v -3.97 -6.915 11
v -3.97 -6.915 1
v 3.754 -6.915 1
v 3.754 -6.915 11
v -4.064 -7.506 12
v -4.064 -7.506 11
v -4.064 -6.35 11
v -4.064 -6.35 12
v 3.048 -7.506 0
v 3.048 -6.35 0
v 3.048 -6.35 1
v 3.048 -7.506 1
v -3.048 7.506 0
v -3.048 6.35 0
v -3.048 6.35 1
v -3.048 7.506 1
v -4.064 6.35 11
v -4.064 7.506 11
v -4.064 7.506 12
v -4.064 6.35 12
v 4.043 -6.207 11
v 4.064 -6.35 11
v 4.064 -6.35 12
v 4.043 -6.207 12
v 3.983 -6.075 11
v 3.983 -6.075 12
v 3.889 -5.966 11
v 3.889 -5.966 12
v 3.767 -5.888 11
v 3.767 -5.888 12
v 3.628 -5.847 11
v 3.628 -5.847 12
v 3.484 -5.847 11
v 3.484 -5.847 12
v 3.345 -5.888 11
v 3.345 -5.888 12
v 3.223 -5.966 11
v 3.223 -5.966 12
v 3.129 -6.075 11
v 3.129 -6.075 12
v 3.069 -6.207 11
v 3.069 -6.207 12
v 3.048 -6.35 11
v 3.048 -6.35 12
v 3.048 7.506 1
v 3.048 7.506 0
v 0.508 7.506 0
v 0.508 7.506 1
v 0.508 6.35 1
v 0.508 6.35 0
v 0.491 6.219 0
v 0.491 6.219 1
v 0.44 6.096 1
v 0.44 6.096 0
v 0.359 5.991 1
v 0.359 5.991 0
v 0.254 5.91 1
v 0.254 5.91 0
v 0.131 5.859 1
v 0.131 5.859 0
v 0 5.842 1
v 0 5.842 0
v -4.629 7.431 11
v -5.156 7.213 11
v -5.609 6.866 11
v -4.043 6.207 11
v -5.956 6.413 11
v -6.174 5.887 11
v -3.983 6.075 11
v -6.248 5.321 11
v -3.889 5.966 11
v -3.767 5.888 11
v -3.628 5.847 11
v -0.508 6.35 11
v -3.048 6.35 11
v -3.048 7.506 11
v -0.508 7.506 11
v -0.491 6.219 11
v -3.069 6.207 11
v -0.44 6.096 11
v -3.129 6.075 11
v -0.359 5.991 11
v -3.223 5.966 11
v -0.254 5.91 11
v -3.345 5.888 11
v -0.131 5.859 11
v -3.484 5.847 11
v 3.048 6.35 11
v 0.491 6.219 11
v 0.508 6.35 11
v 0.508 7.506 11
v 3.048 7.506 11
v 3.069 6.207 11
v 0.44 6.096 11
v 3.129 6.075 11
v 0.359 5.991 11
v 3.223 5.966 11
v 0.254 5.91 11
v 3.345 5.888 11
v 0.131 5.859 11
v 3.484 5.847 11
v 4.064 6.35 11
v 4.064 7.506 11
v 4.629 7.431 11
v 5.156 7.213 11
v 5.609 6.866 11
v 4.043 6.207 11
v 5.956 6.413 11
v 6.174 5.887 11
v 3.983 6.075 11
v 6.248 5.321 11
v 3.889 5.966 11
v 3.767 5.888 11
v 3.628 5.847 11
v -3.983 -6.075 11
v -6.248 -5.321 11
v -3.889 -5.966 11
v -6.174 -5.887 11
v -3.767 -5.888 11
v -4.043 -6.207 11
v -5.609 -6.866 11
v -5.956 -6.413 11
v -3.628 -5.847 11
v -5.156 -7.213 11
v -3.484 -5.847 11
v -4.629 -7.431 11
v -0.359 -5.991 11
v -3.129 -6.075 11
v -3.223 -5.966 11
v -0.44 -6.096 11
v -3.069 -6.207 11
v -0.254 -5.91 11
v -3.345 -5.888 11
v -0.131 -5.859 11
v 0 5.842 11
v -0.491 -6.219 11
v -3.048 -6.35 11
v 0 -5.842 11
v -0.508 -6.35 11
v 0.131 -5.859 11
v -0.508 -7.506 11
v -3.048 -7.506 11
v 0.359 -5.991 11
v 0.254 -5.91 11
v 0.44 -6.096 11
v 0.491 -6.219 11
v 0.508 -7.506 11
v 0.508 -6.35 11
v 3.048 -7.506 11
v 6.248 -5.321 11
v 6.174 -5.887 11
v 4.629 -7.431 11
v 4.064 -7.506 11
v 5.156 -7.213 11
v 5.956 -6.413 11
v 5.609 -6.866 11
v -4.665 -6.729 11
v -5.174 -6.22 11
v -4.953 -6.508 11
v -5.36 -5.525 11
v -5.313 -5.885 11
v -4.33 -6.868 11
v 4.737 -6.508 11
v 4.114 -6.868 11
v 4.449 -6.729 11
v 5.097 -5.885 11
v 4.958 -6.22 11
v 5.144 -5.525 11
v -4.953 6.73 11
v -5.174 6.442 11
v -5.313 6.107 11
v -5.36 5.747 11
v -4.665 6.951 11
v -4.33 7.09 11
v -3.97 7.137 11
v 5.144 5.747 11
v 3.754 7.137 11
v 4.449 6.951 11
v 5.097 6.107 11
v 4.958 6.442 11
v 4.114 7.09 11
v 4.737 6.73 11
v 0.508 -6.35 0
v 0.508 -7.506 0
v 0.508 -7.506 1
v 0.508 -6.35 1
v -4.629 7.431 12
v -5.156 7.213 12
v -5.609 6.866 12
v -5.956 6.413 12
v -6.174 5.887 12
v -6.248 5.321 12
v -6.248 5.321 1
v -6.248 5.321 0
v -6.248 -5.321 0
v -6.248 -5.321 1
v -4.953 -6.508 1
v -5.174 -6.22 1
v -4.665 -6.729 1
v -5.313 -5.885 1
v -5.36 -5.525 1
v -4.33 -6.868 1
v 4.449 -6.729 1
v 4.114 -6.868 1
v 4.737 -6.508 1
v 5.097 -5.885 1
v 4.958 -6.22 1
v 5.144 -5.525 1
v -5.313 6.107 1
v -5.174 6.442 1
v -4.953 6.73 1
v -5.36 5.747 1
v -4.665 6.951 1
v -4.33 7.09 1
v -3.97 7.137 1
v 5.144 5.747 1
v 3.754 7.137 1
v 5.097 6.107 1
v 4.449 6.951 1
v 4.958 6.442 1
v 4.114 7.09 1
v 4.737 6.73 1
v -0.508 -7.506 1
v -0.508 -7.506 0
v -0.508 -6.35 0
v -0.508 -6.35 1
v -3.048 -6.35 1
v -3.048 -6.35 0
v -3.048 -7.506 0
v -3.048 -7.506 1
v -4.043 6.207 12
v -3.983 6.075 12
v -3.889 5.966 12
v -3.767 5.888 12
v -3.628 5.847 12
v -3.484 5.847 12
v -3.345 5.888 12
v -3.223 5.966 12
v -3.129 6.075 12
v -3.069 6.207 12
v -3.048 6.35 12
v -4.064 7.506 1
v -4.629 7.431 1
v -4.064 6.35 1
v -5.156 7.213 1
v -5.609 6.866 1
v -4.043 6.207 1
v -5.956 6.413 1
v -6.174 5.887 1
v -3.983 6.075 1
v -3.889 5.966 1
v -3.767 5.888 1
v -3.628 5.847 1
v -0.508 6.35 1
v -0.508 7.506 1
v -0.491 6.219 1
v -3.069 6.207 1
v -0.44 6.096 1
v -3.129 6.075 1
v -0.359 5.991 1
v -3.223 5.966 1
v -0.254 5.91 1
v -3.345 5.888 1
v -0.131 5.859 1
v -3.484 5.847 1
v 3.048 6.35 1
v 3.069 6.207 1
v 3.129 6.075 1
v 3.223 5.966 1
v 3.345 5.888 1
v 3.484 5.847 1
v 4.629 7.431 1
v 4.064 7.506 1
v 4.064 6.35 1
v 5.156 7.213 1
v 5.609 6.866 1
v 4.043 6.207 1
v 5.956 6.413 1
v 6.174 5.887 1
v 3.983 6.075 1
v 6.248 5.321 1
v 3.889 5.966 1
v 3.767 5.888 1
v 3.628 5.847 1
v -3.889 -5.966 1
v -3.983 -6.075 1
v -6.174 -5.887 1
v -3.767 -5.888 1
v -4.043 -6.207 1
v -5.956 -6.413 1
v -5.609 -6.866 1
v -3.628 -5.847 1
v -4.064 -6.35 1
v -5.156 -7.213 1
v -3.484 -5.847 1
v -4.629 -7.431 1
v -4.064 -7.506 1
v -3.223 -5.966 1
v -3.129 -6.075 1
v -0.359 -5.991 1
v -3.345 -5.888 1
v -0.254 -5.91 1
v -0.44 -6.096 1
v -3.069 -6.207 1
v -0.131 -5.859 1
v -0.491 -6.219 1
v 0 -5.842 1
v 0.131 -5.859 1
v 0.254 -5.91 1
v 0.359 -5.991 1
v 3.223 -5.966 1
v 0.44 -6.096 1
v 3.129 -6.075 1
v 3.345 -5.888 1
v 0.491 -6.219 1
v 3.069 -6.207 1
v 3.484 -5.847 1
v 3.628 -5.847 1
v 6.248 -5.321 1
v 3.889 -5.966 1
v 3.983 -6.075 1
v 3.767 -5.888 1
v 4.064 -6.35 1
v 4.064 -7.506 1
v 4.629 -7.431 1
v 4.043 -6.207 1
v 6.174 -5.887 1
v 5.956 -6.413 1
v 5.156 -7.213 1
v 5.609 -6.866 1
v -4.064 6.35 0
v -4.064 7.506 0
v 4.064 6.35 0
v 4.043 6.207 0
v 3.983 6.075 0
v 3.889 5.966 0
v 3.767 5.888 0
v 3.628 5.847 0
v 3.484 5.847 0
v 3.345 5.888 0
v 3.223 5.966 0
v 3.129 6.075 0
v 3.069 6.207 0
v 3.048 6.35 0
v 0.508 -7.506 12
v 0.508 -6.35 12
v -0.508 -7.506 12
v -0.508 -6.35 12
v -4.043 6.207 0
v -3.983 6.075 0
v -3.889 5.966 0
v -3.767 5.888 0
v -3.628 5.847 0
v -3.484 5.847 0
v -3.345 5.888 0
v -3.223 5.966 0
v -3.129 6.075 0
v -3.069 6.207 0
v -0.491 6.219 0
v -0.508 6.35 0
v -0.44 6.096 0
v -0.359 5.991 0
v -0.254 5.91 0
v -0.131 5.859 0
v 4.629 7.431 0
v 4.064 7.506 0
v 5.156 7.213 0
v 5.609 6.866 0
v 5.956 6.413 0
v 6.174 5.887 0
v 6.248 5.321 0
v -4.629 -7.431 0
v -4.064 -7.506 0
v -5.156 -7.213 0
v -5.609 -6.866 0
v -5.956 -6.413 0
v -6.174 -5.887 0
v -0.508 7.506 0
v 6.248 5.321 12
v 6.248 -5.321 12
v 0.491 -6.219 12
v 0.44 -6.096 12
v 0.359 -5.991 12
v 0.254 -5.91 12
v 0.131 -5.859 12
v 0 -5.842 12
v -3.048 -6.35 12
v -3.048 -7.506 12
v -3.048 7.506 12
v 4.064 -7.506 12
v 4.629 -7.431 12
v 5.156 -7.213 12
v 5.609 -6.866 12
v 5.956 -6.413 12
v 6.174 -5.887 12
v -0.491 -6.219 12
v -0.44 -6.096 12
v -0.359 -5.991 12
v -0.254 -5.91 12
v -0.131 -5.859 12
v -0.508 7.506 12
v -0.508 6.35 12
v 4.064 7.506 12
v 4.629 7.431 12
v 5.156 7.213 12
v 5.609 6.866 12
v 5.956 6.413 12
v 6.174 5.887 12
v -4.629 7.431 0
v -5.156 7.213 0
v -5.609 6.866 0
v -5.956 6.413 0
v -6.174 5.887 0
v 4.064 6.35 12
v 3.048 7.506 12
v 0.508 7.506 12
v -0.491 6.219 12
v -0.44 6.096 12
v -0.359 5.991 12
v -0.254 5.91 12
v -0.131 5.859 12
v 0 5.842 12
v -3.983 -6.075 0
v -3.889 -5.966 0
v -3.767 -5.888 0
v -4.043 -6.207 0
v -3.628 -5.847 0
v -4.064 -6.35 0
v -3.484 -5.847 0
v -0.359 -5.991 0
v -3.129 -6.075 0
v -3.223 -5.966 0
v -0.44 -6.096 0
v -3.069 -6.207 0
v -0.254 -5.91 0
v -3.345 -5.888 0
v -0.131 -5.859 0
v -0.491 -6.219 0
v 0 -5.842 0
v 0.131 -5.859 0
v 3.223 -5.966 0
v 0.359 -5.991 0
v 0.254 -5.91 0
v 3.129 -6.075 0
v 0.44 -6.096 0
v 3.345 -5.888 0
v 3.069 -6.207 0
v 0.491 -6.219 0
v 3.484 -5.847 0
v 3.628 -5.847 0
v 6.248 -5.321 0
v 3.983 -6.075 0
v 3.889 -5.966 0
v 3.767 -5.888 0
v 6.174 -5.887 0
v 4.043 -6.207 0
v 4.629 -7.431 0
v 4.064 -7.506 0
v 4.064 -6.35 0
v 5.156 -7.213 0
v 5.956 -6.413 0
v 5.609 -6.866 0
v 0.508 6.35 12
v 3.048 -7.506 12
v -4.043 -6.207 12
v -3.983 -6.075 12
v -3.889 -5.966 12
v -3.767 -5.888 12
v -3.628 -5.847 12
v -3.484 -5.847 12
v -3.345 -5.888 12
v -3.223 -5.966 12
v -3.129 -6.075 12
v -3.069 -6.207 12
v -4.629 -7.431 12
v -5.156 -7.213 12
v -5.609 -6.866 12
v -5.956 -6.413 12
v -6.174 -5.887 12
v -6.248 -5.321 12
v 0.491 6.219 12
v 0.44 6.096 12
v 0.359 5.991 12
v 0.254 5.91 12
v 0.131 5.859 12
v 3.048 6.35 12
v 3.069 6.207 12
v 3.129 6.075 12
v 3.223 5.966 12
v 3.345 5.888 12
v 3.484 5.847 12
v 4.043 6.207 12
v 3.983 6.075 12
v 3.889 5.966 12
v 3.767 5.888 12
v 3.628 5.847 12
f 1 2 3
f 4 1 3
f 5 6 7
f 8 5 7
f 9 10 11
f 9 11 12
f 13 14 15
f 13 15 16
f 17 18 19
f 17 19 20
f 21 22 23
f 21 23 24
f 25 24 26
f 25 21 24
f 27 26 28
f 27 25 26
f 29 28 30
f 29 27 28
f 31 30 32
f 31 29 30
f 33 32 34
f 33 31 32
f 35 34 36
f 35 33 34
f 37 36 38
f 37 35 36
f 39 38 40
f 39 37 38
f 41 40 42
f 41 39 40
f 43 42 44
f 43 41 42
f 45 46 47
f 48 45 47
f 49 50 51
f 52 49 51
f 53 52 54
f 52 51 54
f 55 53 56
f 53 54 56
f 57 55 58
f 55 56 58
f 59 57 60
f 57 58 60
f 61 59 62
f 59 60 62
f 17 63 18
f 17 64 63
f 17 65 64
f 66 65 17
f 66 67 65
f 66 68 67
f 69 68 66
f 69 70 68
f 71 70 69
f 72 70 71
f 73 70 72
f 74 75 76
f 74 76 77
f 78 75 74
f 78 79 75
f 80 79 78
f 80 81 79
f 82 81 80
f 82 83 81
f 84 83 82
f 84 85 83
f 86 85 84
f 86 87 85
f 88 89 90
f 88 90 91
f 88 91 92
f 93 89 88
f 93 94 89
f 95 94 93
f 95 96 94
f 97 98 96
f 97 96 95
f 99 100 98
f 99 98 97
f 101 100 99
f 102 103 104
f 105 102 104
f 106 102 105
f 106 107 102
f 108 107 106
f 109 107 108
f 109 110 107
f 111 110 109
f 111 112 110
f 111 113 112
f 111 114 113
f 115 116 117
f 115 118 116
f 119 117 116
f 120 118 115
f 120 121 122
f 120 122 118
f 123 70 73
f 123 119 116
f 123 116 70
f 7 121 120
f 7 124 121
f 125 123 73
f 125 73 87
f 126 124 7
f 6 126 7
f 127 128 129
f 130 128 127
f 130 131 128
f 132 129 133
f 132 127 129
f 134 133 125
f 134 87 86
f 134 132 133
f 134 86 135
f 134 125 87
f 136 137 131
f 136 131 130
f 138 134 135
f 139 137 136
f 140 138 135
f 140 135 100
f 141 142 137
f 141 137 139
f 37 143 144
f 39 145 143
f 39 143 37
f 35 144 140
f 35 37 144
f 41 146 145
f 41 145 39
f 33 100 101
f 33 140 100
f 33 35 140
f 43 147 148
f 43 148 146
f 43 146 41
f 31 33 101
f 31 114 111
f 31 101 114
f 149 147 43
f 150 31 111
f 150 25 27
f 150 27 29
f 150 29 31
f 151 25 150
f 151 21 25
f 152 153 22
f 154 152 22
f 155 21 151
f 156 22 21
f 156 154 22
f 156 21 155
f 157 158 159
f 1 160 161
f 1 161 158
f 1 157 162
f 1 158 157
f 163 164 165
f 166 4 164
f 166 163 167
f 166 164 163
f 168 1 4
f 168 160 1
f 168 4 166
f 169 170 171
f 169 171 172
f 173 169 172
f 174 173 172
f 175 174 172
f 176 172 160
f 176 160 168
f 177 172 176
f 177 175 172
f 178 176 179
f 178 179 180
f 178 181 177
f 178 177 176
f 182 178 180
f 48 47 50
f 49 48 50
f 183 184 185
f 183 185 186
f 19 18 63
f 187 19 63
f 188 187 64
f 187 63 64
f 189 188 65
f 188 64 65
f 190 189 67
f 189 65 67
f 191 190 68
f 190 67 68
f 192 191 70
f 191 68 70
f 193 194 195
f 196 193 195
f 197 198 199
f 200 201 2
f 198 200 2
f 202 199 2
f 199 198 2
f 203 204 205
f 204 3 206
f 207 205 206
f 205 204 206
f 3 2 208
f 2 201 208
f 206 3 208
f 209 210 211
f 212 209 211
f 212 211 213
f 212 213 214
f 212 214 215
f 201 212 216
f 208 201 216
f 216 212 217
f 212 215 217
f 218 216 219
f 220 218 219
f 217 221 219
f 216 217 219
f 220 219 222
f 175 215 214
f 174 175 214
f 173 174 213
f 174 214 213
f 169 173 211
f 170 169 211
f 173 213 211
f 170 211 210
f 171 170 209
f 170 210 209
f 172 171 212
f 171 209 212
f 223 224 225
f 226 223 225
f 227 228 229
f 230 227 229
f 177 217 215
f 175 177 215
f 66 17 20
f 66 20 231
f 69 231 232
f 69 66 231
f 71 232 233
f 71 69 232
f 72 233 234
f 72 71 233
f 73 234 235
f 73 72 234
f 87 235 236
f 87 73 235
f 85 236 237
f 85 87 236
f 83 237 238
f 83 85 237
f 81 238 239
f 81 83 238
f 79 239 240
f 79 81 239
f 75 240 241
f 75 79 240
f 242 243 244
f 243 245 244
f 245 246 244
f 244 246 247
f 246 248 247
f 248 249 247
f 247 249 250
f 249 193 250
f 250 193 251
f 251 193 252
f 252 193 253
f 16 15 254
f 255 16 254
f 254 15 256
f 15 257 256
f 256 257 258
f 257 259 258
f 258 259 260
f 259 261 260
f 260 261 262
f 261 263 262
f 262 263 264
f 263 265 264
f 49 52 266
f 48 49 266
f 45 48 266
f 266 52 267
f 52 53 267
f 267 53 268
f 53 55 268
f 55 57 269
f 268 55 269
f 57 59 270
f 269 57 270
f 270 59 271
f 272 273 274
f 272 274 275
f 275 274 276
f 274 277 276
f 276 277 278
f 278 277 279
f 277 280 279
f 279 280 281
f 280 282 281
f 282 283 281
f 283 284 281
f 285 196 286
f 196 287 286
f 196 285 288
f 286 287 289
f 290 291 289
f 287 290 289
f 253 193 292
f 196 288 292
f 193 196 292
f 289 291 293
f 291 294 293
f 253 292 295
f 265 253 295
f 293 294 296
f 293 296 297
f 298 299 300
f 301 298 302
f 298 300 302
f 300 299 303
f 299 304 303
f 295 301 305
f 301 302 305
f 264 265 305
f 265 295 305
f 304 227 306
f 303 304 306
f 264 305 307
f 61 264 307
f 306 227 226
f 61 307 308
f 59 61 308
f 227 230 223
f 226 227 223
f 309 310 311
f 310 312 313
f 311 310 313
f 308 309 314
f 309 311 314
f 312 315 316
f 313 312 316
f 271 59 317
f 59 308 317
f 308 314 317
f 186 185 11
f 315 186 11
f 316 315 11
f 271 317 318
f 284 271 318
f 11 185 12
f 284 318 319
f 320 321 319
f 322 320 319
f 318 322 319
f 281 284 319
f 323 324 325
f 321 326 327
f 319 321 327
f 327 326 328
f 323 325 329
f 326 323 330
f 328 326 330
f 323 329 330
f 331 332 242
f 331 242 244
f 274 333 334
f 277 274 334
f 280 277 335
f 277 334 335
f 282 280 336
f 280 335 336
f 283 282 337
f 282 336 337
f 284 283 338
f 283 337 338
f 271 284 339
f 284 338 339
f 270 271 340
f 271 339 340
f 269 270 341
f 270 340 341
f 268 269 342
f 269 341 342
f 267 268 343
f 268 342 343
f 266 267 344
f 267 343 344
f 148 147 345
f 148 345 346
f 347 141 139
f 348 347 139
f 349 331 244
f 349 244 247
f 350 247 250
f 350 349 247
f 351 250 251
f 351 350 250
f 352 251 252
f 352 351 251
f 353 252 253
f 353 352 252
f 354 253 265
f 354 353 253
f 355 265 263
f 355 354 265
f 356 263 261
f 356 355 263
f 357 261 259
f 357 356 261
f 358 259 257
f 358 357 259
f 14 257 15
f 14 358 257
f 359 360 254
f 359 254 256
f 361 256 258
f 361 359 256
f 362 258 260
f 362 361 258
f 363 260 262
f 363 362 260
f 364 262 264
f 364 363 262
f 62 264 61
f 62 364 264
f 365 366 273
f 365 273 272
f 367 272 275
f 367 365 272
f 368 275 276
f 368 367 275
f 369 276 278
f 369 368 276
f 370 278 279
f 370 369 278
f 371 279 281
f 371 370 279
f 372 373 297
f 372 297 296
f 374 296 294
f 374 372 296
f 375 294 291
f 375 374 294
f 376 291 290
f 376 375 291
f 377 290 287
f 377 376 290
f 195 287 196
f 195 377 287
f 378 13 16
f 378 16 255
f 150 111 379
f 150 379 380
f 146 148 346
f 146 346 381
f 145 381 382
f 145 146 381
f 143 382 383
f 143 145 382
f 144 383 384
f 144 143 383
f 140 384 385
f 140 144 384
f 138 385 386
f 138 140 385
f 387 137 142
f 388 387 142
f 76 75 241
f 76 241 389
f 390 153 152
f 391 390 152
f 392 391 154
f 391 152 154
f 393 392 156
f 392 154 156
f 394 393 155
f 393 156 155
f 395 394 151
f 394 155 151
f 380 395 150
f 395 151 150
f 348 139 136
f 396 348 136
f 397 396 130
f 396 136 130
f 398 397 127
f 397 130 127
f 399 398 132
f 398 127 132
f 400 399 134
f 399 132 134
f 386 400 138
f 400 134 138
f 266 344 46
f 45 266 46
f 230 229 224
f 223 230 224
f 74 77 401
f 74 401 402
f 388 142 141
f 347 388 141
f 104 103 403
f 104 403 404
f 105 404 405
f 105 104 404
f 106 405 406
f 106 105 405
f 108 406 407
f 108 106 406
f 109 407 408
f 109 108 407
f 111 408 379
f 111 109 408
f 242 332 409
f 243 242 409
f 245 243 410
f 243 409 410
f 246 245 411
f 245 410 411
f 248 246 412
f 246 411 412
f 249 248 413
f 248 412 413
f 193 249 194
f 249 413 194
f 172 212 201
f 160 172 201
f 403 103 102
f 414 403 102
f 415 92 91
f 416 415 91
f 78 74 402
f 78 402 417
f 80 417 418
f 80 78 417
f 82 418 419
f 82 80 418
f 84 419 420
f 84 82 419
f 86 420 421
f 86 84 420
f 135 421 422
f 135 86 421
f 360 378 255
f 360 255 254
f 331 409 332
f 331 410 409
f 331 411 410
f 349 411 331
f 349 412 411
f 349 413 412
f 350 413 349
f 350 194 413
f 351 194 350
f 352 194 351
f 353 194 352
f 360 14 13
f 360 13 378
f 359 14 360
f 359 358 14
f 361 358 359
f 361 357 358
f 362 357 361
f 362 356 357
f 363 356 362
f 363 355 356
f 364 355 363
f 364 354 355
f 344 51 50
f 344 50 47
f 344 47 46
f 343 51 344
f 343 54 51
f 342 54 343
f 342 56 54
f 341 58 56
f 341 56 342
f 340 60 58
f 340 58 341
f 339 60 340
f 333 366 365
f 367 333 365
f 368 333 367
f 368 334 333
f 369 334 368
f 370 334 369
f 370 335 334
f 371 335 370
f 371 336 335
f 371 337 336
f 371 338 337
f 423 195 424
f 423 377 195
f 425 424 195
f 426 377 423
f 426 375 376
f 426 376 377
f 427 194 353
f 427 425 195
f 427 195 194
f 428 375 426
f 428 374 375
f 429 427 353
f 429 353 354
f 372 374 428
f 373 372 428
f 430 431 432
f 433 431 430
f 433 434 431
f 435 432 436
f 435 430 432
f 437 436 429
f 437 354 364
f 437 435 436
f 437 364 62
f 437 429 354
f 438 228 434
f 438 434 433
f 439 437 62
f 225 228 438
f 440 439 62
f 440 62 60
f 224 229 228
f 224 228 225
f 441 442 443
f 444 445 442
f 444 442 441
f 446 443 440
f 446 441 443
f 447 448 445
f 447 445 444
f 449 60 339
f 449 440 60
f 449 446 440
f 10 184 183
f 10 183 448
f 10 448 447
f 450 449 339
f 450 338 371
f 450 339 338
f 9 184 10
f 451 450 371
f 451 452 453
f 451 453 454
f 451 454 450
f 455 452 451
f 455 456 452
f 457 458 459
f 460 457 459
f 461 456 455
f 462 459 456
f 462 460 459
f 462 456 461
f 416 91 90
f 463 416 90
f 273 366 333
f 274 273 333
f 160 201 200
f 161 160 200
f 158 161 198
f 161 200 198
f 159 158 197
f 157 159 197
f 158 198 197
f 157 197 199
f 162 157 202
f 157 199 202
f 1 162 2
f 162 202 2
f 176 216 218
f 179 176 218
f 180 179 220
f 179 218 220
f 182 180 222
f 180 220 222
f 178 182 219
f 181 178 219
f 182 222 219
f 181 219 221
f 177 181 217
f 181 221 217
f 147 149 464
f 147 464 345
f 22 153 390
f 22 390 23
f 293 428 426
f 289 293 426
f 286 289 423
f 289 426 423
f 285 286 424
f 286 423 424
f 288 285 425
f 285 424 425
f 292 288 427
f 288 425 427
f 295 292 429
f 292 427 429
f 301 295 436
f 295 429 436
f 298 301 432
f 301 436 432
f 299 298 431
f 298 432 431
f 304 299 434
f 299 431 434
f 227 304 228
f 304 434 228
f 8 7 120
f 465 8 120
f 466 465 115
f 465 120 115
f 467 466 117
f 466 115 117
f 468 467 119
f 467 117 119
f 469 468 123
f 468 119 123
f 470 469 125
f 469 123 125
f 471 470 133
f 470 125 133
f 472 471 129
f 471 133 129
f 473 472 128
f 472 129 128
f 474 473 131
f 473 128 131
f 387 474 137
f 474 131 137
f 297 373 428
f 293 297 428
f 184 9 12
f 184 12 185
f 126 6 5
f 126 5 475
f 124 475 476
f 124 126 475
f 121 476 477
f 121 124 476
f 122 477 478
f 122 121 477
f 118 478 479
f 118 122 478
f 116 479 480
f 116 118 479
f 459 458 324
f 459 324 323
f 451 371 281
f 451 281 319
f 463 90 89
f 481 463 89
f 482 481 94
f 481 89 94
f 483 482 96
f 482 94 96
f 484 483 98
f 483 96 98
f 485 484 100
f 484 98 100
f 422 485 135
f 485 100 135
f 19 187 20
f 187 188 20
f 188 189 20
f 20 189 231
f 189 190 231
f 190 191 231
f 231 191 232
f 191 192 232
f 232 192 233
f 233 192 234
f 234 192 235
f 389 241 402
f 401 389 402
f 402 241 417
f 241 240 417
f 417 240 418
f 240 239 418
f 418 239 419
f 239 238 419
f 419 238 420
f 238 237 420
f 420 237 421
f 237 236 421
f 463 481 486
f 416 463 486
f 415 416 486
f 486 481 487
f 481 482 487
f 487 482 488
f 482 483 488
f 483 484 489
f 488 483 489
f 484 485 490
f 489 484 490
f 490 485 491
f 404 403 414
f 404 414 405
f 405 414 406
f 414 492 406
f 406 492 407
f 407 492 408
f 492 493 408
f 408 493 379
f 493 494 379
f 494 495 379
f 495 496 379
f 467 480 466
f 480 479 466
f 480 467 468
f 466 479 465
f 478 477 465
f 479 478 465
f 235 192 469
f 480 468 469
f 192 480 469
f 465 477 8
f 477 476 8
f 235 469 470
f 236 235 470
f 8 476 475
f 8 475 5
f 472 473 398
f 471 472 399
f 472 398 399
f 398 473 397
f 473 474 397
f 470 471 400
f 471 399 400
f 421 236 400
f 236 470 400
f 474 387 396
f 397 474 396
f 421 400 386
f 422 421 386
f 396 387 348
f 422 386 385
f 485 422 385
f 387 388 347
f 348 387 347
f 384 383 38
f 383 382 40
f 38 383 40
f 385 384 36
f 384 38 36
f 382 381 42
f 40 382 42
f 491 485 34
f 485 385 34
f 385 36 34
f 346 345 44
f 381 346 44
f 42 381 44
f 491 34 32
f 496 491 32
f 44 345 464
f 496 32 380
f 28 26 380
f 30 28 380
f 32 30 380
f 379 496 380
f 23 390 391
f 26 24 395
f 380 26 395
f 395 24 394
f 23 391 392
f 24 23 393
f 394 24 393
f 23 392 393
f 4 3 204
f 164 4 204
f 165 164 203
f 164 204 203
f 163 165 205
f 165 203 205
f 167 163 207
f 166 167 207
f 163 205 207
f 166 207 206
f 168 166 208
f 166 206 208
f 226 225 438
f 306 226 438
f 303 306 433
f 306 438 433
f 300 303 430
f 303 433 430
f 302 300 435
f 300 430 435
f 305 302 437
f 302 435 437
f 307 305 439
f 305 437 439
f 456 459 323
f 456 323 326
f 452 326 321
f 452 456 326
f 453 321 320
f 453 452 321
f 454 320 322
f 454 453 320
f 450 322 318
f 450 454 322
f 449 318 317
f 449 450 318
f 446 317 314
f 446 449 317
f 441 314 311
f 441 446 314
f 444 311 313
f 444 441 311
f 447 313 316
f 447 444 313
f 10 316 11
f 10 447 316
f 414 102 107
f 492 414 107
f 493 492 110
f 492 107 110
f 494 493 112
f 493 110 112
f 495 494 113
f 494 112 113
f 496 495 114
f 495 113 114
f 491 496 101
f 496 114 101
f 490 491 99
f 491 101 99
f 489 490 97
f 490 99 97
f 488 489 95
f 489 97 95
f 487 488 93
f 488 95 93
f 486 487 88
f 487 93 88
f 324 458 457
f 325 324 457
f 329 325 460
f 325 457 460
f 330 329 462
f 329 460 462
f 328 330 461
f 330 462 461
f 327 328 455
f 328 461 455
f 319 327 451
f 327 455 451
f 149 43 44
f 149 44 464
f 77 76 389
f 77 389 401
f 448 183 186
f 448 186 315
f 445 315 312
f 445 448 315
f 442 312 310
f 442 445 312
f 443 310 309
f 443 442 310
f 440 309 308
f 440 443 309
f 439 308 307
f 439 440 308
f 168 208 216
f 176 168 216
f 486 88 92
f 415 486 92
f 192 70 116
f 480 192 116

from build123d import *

# Parameters (mm, degrees)
PAD_DEPTH                  = 1
PAD_MIRRORED_2_DEPTH       = 1
PAD001_DEPTH               = 10
PAD002_DEPTH               = 1
PAD002_MIRRORED002_2_DEPTH = 1


with BuildPart() as body:
    # Sketch → Pad (new body)
    with BuildSketch(Plane.XY):
        with BuildLine():
            Line((-6.2484, 0), (-6.2484, 5.3213))
            ThreePointArc((-4.064, 7.5057), (-5.608604, 6.865904), (-6.2484, 5.3213))
            Line((-4.064, 7.5057), (-4.064, 6.35))
            ThreePointArc((-4.064, 6.35), (-3.556, 5.842), (-3.048, 6.35))
            Line((-3.048, 6.35), (-3.048, 7.5057))
            Line((-3.048, 7.5057), (-0.508, 7.5057))
            Line((-0.508, 7.5057), (-0.508, 6.35))
            ThreePointArc((-0.508, 6.35), (-0.35921, 5.99079), (0, 5.842))
            Line((0, 5.842), (0, 0))
            Line((-6.2484, 0), (0, 0))
        make_face()
    pad = extrude(amount=PAD_DEPTH)

    # Sketch Mirrored 2 → Pad Mirrored 2 (add)
    with BuildSketch(Plane(origin=(0, 0, 0), x_dir=(-1, 0, 0), z_dir=(0, 0, -1))):
        with BuildLine():
            Line((-6.2484, 0), (-6.2484, 5.3213))
            ThreePointArc((-4.064, 7.5057), (-5.608604, 6.865904), (-6.2484, 5.3213))
            Line((-4.064, 7.5057), (-4.064, 6.35))
            ThreePointArc((-4.064, 6.35), (-3.556, 5.842), (-3.048, 6.35))
            Line((-3.048, 6.35), (-3.048, 7.5057))
            Line((-3.048, 7.5057), (-0.508, 7.5057))
            Line((-0.508, 7.5057), (-0.508, 6.35))
            ThreePointArc((-0.508, 6.35), (-0.35921, 5.99079), (0, 5.842))
            Line((0, 5.842), (0, 0))
            Line((-6.2484, 0), (0, 0))
        make_face()
    pad_mirrored_2 = extrude(amount=-PAD_MIRRORED_2_DEPTH)

    # Mirrored001: Pad, Pad Mirrored 2 across XZ
    add(pad.mirror(Plane.XZ))
    add(pad_mirrored_2.mirror(Plane.XZ))


with BuildPart() as body001:
    # Sketch001 (on Face1 of ShapeBinder) → Pad001 (new body)
    with BuildSketch(Plane.XY.offset(1)):
        with BuildLine():
            Line((-3.970166, -6.914917), (3.75419, -6.914917))
            ThreePointArc((3.75419, -6.914917), (4.736908, -6.507862), (5.143963, -5.525144))
            Line((5.143963, -5.525144), (5.143963, 5.747452))
            ThreePointArc((5.143963, 5.747452), (4.736908, 6.73017), (3.75419, 7.137225))
            Line((3.75419, 7.137225), (-3.970166, 7.137225))
            ThreePointArc((-3.970166, 7.137225), (-4.952884, 6.73017), (-5.359939, 5.747452))
            Line((-5.359939, 5.747452), (-5.359939, -5.525144))
            ThreePointArc((-5.359939, -5.525144), (-4.952884, -6.507862), (-3.970166, -6.914917))
        make_face()
    extrude(amount=PAD001_DEPTH)


with BuildPart() as body002:
    # Sketch002 (on Face1 of CopyPad001) → Pad002 (new body)
    with BuildSketch(Plane.XY.offset(11)):
        with BuildLine():
            Line((-6.2484, 0), (-6.2484, 5.3213))
            ThreePointArc((-4.064, 7.5057), (-5.608604, 6.865904), (-6.2484, 5.3213))
            Line((-4.064, 7.5057), (-4.064, 6.35))
            ThreePointArc((-4.064, 6.35), (-3.556, 5.842), (-3.048, 6.35))
            Line((-3.048, 6.35), (-3.048, 7.5057))
            Line((-3.048, 7.5057), (-0.508, 7.5057))
            Line((-0.508, 7.5057), (-0.508, 6.35))
            ThreePointArc((-0.508, 6.35), (-0.35921, 5.99079), (0, 5.842))
            Line((0, 5.842), (0, 0))
            Line((-6.2484, 0), (0, 0))
        make_face()
    pad002 = extrude(amount=PAD002_DEPTH)

    # Sketch002 Mirrored002 2 → Pad002 Mirrored002 2 (add)
    with BuildSketch(Plane(origin=(0, 0, 11), x_dir=(-1, 0, 0), z_dir=(0, 0, -1))):
        with BuildLine():
            Line((-6.2484, 0), (-6.2484, 5.3213))
            ThreePointArc((-4.064, 7.5057), (-5.608604, 6.865904), (-6.2484, 5.3213))
            Line((-4.064, 7.5057), (-4.064, 6.35))
            ThreePointArc((-4.064, 6.35), (-3.556, 5.842), (-3.048, 6.35))
            Line((-3.048, 6.35), (-3.048, 7.5057))
            Line((-3.048, 7.5057), (-0.508, 7.5057))
            Line((-0.508, 7.5057), (-0.508, 6.35))
            ThreePointArc((-0.508, 6.35), (-0.35921, 5.99079), (0, 5.842))
            Line((0, 5.842), (0, 0))
            Line((-6.2484, 0), (0, 0))
        make_face()
    pad002_mirrored002_2 = extrude(amount=-PAD002_MIRRORED002_2_DEPTH)

    # Mirrored003: Pad002, Pad002 Mirrored002 2 across XZ
    add(pad002.mirror(Plane.XZ))
    add(pad002_mirrored002_2.mirror(Plane.XZ))


solid = Compound([body.part, body001.part, body002.part])
